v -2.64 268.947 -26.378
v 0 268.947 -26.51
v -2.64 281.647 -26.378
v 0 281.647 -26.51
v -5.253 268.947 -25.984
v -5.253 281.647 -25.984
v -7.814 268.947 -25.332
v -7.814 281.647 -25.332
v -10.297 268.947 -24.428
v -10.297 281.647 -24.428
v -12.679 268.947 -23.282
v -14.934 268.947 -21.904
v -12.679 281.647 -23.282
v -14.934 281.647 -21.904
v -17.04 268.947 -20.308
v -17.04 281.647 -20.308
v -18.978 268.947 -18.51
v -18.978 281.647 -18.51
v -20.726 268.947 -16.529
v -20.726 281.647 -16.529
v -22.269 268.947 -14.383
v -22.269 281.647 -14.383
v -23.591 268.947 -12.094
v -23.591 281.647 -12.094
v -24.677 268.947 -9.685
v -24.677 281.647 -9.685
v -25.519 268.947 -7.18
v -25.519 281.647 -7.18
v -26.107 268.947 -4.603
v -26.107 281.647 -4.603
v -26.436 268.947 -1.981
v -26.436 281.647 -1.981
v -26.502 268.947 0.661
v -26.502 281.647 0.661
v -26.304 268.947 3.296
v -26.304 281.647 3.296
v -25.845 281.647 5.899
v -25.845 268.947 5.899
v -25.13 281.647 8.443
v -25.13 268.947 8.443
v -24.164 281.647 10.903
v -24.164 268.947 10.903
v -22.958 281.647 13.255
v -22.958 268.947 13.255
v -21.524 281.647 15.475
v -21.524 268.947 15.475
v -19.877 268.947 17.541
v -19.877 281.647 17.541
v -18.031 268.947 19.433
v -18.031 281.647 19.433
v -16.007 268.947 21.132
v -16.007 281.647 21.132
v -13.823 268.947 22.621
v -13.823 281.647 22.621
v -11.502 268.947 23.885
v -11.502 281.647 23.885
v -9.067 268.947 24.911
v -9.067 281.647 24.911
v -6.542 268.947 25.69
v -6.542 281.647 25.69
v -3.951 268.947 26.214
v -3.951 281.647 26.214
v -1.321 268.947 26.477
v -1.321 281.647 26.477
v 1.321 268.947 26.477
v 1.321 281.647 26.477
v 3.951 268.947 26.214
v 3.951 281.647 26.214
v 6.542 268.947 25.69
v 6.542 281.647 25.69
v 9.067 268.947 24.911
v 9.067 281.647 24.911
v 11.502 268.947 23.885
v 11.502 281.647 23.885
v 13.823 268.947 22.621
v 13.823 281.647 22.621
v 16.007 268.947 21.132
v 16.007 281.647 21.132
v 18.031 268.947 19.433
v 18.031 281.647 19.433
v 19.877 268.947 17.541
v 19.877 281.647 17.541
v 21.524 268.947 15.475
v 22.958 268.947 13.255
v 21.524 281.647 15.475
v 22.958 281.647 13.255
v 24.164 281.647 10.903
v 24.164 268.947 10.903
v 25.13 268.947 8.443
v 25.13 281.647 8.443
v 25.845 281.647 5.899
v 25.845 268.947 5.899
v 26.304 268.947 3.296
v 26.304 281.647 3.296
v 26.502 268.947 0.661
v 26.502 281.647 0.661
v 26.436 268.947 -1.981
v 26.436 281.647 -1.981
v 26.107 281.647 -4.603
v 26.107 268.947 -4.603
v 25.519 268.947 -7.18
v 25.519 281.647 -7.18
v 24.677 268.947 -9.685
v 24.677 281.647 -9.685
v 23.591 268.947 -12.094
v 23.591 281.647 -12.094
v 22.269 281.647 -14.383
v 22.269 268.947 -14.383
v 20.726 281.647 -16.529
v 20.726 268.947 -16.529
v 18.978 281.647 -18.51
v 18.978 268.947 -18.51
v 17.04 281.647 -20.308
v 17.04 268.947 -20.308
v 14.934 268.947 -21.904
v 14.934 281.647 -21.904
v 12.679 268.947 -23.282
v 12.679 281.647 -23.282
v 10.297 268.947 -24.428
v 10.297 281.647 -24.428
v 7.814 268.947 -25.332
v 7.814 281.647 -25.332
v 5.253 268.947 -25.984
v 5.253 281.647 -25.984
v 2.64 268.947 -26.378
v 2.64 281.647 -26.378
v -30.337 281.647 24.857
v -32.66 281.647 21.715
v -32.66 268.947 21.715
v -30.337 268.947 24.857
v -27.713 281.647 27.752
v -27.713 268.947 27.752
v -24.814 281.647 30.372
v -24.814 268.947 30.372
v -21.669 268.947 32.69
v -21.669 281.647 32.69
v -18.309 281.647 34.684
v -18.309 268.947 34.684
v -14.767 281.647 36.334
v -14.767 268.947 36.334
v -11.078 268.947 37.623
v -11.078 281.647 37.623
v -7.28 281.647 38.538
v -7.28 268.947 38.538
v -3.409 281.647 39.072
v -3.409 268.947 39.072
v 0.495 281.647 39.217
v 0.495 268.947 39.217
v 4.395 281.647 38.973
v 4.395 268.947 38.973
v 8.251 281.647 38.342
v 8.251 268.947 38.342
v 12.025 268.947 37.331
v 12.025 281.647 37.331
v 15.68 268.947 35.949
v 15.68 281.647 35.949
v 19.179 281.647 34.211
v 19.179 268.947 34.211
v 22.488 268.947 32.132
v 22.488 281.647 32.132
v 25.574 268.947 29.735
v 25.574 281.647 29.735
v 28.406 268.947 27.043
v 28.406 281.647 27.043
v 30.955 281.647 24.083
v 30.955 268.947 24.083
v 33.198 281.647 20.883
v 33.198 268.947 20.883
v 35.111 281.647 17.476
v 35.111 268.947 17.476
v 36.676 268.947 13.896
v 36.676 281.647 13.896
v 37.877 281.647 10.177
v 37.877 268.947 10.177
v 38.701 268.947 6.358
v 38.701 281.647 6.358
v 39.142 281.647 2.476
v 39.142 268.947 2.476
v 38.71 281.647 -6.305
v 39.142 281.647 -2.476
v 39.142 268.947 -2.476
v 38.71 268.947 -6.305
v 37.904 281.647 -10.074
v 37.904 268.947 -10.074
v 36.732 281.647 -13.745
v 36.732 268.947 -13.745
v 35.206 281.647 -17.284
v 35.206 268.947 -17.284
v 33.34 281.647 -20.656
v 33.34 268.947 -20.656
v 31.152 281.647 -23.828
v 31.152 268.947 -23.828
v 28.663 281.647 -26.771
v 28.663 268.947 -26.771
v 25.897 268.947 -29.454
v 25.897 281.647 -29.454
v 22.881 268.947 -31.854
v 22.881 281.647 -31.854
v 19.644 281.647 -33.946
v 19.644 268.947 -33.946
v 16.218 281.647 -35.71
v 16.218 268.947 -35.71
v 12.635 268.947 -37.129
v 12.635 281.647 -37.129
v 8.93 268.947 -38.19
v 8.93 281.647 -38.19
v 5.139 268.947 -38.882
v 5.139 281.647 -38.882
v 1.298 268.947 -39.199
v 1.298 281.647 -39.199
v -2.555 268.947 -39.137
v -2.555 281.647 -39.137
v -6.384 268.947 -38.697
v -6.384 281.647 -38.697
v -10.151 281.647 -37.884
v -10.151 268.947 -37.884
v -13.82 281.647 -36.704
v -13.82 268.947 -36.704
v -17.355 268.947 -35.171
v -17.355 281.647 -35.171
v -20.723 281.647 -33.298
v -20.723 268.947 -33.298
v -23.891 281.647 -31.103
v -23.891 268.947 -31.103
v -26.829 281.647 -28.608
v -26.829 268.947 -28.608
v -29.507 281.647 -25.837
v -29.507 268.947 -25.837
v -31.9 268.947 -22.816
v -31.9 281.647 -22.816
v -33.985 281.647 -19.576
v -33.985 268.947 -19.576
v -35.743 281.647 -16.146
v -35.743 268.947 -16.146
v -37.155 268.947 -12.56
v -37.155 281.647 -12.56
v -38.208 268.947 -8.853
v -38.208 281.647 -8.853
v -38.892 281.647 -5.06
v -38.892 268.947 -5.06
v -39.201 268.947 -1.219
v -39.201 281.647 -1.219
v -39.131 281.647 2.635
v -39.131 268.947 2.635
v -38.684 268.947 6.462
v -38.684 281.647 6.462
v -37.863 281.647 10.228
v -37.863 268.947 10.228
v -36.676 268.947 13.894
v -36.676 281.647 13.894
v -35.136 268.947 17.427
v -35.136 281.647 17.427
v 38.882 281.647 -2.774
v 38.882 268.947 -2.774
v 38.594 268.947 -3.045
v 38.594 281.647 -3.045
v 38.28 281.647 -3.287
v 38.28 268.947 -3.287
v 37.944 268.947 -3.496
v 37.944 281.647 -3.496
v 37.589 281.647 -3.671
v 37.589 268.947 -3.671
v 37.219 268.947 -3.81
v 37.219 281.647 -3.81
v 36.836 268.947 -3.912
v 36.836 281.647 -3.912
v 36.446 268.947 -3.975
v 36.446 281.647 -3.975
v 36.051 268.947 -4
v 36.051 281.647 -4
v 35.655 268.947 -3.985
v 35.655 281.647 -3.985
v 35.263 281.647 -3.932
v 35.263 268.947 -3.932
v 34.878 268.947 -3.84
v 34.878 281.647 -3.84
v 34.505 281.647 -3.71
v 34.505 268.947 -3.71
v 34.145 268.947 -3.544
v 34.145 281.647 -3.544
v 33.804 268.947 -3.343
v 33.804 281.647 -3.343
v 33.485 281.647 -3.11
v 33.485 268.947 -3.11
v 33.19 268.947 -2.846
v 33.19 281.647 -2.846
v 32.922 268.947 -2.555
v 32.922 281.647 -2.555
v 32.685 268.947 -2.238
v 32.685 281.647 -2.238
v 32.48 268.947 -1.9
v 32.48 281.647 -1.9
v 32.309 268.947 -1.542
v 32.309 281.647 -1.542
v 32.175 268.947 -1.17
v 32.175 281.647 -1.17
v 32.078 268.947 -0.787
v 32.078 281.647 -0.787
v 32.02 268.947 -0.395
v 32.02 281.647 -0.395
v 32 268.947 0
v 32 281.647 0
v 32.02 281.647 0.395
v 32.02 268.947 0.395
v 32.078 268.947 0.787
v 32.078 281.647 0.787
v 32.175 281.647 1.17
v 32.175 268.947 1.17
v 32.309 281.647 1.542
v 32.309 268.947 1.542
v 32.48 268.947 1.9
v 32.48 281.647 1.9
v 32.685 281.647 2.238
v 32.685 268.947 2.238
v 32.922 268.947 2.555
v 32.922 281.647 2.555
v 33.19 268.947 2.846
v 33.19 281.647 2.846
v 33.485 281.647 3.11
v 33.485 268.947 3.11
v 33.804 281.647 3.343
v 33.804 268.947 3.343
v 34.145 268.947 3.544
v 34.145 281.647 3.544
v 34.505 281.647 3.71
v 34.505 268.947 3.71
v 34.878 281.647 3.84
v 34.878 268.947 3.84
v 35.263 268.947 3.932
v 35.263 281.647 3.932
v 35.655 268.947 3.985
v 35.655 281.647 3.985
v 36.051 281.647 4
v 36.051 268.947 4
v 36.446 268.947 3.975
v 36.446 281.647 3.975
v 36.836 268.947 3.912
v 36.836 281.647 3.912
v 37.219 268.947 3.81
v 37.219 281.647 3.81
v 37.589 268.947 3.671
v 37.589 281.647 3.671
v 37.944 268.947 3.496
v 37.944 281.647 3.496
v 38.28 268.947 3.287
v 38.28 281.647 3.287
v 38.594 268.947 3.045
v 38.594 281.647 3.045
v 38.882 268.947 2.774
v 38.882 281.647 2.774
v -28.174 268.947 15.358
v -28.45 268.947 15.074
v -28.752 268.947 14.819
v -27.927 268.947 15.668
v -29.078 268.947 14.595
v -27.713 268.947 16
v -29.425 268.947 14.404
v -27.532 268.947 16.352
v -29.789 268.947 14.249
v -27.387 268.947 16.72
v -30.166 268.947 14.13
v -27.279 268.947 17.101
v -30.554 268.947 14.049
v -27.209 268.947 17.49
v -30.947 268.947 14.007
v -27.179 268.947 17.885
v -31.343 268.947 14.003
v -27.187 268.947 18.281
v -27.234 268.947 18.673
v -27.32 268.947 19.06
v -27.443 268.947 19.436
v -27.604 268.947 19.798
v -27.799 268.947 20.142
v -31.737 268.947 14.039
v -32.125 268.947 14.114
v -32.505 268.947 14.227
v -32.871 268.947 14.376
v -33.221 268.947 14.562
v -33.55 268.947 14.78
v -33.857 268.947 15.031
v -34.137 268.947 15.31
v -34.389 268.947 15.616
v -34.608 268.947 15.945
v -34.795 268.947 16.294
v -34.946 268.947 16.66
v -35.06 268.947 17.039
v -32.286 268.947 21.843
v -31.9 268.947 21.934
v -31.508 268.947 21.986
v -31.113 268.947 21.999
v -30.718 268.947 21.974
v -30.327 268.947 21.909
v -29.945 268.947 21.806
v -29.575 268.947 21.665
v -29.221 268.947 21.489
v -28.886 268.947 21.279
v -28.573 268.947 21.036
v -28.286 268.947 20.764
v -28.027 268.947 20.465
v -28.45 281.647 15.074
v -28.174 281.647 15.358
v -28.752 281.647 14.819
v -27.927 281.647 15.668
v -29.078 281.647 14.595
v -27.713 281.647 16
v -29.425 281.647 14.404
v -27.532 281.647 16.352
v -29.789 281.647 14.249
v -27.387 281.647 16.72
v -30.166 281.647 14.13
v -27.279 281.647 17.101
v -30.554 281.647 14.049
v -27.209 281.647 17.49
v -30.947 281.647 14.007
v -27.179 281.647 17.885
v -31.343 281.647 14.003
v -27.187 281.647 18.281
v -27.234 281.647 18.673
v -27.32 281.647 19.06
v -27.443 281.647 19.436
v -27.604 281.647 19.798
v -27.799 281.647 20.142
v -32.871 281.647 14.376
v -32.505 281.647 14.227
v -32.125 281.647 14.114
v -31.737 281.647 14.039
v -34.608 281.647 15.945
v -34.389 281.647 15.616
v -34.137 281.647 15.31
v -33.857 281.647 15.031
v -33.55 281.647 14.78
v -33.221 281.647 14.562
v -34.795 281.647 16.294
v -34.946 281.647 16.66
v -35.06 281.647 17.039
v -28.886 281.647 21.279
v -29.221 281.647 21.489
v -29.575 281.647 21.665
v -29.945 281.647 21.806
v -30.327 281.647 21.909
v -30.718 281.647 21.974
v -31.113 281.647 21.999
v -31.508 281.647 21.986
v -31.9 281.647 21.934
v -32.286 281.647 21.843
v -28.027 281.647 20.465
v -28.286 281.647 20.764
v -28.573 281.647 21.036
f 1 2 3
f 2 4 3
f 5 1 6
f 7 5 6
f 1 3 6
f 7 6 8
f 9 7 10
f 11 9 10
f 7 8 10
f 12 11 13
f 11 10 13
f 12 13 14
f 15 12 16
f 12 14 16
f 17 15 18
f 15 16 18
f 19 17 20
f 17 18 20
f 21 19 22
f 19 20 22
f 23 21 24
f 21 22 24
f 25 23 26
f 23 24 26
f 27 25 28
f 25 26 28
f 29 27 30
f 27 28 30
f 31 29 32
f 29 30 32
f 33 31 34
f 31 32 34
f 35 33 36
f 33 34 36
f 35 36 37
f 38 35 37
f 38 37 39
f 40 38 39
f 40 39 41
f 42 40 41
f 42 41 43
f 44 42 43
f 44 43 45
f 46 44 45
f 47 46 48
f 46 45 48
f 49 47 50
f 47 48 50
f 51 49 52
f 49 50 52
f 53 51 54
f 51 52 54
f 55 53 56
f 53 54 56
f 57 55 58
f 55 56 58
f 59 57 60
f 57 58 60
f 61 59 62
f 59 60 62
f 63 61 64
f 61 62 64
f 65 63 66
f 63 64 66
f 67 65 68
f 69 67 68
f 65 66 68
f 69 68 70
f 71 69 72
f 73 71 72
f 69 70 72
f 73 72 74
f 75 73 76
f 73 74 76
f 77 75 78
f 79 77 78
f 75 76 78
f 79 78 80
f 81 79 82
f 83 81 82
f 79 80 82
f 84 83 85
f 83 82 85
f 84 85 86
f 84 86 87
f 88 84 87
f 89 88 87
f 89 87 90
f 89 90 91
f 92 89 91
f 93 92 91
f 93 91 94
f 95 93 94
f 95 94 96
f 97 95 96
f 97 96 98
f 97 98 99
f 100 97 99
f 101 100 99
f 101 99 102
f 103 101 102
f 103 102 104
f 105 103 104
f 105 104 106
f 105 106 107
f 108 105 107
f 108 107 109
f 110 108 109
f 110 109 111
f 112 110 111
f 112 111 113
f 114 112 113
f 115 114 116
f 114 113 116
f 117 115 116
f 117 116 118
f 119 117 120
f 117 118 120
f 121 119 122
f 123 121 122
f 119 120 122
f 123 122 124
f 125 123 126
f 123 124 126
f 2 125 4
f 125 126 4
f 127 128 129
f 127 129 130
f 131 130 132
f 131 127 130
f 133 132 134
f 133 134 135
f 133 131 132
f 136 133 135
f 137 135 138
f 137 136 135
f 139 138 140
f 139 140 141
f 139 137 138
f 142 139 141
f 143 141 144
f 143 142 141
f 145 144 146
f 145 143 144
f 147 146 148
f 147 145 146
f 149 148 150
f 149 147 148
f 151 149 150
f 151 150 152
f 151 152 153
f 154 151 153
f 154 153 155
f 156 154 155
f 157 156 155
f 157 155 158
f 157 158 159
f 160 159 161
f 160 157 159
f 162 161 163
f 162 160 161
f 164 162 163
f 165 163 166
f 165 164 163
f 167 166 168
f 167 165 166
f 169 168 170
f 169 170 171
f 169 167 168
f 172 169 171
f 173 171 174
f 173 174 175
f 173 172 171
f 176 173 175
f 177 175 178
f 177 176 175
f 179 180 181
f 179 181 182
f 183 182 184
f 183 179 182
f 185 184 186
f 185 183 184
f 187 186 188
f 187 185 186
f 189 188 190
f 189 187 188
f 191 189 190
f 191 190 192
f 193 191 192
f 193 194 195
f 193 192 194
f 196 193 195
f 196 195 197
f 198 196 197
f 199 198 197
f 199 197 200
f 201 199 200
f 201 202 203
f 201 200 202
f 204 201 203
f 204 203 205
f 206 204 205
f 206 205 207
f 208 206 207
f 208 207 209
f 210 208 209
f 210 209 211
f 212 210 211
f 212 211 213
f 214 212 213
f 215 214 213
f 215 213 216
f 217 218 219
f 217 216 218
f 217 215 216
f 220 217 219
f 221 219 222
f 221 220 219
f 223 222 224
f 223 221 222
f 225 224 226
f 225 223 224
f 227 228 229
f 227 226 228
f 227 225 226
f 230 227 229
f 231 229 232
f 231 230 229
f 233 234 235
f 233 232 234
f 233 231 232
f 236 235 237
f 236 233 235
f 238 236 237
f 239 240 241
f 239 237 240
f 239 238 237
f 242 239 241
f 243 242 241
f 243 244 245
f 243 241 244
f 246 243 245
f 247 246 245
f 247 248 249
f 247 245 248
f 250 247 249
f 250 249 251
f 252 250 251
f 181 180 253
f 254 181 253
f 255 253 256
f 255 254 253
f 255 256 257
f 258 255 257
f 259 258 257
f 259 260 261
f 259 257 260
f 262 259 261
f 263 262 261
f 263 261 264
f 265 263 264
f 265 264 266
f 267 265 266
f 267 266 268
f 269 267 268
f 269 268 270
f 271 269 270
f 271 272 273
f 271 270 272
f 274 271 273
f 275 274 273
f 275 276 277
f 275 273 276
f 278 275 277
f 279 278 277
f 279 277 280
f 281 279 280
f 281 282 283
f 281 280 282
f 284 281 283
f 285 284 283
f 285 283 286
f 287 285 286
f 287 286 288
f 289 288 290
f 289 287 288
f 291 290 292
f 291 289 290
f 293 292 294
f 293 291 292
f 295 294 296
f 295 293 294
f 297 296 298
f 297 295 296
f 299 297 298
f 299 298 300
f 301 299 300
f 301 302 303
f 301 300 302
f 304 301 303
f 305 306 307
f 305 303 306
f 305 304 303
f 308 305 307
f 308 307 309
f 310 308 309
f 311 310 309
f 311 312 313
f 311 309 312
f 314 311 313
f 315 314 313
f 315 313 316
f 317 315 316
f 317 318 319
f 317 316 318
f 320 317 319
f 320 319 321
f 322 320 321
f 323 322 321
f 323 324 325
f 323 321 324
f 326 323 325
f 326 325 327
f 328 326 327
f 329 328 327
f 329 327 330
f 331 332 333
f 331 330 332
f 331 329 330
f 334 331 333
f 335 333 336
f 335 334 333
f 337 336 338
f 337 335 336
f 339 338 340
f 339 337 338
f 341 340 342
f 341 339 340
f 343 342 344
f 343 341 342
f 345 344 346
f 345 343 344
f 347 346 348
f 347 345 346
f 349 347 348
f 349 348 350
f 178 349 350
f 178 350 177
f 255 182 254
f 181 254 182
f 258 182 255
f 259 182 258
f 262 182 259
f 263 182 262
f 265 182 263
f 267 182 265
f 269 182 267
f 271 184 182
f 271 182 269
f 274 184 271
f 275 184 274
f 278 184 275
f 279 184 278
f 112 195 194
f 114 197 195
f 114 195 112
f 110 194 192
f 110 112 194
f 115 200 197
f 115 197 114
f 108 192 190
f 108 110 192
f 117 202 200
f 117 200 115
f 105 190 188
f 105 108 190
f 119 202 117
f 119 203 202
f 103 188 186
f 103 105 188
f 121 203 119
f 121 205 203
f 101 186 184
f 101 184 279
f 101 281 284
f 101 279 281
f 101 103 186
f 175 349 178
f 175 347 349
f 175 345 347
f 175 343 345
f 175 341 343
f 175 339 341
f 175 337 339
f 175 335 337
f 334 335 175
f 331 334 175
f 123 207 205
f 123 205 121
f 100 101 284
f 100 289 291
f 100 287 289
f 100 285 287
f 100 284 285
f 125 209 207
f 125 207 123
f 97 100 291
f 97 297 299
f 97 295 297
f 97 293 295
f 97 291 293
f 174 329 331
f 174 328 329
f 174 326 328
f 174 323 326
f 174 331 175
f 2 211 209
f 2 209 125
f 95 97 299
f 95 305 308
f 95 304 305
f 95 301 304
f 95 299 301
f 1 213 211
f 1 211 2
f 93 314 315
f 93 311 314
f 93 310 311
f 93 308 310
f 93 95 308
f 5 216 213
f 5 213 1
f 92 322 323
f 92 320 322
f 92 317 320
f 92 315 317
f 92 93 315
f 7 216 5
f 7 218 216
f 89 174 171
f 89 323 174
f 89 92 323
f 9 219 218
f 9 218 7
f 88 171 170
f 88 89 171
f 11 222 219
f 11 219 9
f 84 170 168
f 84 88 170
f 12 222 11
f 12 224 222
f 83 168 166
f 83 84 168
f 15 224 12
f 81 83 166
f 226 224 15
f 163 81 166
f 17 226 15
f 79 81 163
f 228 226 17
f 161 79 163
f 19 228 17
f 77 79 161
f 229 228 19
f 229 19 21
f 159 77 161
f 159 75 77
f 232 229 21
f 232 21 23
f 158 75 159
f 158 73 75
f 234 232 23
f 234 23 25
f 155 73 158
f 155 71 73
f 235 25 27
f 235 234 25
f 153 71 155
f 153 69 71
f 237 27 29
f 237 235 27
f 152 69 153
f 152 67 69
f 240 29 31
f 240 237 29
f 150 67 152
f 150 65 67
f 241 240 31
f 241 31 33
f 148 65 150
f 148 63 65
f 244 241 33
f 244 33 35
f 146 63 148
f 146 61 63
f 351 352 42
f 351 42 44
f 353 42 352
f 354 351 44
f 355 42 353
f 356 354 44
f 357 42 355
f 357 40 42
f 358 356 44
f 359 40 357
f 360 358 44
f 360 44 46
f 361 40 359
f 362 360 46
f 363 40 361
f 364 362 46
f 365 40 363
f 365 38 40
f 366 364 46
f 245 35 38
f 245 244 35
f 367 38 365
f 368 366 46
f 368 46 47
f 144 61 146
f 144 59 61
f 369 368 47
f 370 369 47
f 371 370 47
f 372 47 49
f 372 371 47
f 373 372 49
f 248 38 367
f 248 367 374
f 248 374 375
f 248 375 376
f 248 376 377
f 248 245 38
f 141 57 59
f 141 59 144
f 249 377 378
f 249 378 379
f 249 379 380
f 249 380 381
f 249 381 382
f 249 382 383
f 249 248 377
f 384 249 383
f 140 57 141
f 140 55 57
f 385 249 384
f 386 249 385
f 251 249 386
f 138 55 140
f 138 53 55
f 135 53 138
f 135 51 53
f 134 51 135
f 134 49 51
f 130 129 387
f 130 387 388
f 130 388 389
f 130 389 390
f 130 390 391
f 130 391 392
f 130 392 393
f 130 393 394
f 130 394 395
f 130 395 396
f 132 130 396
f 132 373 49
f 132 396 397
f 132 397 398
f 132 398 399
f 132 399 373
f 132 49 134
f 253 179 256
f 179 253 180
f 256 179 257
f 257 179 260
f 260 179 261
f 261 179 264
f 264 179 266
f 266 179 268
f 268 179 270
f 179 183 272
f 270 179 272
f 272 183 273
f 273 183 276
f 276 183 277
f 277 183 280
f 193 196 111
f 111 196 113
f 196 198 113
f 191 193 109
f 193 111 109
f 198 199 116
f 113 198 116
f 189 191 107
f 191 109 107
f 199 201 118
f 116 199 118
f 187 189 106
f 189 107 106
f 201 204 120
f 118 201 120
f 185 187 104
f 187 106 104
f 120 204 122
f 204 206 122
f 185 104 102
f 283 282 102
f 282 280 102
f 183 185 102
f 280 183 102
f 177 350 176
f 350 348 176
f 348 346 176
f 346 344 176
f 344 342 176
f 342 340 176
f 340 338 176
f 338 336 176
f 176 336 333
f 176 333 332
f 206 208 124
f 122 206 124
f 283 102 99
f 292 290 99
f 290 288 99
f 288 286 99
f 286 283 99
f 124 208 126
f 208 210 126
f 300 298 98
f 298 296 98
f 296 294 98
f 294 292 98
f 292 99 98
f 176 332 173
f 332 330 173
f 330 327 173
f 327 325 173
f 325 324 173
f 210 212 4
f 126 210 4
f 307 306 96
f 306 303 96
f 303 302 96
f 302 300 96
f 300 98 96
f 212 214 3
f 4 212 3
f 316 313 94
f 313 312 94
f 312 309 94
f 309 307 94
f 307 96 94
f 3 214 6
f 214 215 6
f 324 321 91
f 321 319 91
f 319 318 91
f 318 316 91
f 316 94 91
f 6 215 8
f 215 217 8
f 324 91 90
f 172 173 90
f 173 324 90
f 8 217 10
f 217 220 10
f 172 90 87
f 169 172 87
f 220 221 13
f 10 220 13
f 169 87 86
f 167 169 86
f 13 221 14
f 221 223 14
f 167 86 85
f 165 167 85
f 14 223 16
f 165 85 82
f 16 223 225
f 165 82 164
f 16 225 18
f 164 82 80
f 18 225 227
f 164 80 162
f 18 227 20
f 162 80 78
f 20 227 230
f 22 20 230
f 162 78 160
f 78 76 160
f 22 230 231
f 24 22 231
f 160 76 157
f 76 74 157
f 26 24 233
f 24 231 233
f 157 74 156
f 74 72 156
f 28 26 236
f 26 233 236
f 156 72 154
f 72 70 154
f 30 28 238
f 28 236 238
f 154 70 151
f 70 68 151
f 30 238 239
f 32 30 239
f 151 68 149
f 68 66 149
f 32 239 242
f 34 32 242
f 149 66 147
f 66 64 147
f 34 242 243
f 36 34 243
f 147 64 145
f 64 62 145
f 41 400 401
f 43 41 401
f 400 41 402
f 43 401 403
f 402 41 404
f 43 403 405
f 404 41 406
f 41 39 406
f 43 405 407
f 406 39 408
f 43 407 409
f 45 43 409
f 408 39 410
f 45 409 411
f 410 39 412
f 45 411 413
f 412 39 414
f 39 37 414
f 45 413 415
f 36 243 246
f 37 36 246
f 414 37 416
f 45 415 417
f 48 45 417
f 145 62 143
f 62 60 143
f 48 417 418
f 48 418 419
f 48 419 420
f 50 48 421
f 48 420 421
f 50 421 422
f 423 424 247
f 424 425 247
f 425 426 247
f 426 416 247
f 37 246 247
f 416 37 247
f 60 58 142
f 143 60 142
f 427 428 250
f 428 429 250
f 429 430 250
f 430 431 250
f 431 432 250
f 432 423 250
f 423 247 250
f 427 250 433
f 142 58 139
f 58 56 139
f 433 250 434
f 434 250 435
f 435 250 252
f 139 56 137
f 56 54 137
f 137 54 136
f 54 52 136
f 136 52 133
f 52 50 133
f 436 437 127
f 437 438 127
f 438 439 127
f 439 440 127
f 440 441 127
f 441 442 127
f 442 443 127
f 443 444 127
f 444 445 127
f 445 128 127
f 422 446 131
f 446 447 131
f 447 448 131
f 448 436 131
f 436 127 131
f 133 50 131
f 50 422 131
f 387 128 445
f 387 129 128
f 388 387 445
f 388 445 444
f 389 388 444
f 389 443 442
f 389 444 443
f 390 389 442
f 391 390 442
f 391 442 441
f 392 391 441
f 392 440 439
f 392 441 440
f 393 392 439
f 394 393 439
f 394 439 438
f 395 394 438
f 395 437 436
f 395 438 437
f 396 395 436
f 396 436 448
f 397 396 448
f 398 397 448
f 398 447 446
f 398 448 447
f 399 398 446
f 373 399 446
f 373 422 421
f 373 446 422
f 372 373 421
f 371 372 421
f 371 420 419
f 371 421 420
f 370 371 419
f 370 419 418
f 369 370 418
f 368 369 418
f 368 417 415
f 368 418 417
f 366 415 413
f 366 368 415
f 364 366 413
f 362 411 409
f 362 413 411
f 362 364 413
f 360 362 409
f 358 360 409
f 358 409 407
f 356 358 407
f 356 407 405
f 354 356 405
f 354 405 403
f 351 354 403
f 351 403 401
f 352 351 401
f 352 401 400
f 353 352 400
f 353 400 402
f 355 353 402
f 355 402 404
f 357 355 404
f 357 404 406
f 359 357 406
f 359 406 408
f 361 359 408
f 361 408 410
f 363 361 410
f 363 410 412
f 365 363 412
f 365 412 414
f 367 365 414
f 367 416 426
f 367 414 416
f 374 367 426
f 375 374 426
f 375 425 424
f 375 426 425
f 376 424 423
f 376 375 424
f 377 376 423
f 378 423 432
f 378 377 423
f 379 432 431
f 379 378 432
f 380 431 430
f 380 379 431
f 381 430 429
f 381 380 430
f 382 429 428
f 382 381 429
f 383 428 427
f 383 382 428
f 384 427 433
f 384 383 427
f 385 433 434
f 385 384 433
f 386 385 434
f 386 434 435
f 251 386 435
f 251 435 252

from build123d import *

# Parameters (mm, degrees)
SKETCH1_W          = 12.71
SKETCH1_H          = 12.7
SKETCH2_R          = 4
CUT_EXTRUDE3_DEPTH = 288.056150001


with BuildPart() as part:
    # Sketch1 → Revolve1 (revolve)
    with BuildSketch(Plane.XY, mode=Mode.PRIVATE) as revolve1_sk:
        with Locations((32.865, 275.296616264)):
            Rectangle(SKETCH1_W, SKETCH1_H)
    revolve(revolve1_sk.sketch.rotate(Axis((0, 0, 0), (0, 1, 0)), 90), axis=Axis((0, 0, 0), (0, 1, 0)))

    # Sketch2 → Cut-Extrude3 (cut, through all)
    with BuildSketch(Plane(origin=(0, 0, 0), x_dir=(1, 0, 0), z_dir=(0, 1, 0))):
        with Locations((-31.176914536, -18)):
            Circle(SKETCH2_R)
        with Locations((36, 0)):
            Circle(SKETCH2_R)
    extrude(amount=CUT_EXTRUDE3_DEPTH, mode=Mode.SUBTRACT)


solid = part.part
